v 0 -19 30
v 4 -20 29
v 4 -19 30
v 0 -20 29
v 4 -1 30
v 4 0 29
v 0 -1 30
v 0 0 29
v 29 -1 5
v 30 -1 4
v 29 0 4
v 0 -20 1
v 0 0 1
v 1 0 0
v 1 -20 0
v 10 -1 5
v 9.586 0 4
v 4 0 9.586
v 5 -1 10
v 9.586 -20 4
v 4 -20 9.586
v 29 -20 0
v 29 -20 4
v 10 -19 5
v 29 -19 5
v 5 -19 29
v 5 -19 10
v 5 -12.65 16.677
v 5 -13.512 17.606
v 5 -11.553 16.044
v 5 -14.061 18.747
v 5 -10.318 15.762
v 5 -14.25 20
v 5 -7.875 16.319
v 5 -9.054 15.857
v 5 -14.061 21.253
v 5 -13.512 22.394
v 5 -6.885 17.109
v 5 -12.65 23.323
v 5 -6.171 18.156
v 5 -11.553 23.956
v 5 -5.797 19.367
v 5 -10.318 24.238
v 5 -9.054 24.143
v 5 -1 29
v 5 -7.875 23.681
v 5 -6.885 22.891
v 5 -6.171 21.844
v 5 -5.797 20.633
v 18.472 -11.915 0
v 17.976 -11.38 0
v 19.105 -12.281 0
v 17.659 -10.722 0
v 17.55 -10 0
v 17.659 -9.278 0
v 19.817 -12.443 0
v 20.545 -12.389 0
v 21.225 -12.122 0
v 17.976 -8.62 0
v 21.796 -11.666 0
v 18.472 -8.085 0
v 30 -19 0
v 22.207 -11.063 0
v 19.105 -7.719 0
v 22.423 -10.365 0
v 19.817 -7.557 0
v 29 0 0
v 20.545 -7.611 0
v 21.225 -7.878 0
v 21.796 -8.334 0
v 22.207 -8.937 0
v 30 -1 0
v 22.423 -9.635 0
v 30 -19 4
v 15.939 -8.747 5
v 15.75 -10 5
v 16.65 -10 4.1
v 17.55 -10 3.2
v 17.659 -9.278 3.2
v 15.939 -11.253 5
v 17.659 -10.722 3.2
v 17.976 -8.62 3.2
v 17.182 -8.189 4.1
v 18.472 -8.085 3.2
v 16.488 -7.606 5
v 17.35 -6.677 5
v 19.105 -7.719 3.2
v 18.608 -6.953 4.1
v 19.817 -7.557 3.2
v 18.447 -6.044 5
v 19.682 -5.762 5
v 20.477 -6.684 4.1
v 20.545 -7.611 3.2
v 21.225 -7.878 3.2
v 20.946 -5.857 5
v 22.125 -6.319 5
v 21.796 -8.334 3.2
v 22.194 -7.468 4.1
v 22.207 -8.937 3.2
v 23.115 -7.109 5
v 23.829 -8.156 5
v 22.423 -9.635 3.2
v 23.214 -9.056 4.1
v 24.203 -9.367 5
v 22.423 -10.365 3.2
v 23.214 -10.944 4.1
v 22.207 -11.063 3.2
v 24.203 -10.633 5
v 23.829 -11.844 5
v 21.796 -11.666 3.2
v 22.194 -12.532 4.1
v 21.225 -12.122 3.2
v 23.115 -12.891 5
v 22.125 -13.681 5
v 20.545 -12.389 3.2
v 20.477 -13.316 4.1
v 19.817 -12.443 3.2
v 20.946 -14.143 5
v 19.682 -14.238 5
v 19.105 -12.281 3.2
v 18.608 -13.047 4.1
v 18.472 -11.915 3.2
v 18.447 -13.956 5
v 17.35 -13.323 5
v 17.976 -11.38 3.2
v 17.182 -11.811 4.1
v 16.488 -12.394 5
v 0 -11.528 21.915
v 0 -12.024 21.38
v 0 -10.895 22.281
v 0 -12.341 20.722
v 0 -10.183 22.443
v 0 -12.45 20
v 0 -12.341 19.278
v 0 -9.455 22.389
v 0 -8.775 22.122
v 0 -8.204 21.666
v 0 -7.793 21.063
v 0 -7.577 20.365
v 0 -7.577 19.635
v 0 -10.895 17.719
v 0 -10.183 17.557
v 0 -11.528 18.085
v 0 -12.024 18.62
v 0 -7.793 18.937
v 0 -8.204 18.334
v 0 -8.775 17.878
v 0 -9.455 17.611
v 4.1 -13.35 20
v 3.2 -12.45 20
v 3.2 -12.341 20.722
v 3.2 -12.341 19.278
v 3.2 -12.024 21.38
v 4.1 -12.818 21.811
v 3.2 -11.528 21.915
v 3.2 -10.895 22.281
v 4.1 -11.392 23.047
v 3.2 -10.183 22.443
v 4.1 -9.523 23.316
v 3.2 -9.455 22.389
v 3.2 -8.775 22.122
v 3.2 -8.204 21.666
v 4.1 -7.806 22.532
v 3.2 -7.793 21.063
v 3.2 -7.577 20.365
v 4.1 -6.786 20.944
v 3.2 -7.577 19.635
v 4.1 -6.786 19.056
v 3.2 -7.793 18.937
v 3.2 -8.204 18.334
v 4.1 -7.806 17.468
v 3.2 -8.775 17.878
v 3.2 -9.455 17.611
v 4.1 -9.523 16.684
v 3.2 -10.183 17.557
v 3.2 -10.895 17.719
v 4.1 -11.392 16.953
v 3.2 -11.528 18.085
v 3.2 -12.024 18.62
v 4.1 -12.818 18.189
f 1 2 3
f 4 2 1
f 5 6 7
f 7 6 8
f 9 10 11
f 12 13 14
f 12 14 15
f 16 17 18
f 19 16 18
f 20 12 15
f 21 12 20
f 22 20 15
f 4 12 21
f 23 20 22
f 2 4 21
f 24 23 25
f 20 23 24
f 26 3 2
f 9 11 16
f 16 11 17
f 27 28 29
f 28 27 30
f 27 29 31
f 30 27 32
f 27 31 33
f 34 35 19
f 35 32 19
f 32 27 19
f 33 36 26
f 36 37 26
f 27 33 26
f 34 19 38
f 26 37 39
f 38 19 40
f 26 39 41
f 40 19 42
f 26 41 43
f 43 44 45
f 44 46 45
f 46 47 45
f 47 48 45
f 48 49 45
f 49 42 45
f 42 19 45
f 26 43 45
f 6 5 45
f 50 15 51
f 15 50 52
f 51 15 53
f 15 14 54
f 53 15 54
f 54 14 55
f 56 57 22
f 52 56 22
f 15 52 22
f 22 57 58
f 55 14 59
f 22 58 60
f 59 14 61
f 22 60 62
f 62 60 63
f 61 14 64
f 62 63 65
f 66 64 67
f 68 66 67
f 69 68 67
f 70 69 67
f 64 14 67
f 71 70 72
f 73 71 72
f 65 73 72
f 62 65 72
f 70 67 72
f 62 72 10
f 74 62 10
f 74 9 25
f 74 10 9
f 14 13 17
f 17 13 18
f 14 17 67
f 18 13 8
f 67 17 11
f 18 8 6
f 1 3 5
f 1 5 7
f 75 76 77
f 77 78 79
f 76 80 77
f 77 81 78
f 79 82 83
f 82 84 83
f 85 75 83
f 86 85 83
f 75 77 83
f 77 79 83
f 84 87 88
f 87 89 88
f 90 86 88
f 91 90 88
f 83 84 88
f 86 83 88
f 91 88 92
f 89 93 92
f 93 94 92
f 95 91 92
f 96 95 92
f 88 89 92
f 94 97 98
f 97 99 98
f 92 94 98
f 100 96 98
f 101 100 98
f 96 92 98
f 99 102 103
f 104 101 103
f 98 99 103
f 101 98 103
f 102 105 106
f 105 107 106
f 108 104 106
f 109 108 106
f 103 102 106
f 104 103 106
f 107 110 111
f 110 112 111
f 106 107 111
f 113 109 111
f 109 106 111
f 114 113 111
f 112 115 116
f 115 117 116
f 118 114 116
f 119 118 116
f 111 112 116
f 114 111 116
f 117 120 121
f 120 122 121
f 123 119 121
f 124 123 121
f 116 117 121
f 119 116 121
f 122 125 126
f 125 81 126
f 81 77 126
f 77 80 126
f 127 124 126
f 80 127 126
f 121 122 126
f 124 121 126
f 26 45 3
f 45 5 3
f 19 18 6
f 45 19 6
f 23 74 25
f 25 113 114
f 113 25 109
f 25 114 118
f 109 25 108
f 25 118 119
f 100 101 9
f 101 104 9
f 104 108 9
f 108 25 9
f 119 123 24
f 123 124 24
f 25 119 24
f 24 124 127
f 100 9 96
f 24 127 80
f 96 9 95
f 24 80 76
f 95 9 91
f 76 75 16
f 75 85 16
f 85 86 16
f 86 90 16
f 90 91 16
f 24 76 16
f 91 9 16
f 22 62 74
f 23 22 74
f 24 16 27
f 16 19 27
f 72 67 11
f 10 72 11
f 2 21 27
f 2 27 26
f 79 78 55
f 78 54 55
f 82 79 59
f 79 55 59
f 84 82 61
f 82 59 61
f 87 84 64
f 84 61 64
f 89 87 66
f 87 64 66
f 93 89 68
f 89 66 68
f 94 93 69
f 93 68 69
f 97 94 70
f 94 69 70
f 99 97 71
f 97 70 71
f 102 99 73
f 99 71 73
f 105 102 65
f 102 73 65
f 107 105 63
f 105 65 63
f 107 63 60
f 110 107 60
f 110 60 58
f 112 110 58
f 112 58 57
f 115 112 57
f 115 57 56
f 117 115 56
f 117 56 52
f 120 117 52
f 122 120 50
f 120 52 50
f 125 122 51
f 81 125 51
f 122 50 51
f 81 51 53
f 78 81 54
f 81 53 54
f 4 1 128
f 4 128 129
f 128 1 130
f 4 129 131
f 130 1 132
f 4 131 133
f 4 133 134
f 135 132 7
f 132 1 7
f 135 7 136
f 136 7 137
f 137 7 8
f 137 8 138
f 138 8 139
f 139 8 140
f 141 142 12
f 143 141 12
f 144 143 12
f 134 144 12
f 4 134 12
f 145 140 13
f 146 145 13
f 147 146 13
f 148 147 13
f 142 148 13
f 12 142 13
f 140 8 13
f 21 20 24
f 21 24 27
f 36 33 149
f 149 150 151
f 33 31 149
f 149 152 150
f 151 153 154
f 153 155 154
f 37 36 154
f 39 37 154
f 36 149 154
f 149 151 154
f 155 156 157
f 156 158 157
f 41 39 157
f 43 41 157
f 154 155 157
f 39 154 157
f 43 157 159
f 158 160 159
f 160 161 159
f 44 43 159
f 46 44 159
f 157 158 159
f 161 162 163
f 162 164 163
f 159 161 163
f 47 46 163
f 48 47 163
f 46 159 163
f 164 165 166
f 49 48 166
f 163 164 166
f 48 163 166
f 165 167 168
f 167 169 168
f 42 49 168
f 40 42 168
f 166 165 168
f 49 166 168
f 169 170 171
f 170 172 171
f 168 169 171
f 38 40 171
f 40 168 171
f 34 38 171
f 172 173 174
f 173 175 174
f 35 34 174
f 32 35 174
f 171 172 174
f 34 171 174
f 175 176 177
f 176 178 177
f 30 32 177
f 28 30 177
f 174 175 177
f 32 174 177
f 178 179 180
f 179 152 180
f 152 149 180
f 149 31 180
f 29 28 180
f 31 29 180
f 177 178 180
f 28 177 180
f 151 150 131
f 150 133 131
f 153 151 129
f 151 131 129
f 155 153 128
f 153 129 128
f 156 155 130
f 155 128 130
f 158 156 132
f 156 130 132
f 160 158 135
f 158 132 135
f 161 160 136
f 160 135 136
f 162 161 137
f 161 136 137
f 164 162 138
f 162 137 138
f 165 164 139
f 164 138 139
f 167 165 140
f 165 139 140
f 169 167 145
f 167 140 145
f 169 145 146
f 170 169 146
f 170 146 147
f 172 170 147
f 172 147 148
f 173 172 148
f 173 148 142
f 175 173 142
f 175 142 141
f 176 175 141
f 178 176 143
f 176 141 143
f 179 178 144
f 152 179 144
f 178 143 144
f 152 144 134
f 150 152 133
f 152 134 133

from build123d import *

# Parameters (mm, degrees)
F2_DEPTH             = 20
F3_SIZE              = 5
F6_D                 = 4.9
F6_DEPTH             = 16
F6_CSINK_D           = 8.5
F6_CSINK_ANGLE       = 90
F6_TIP               = 1.4721085166
F6_ON_F4_D           = 4.9
F6_ON_F4_DEPTH       = 16
F6_ON_F4_CSINK_D     = 8.5
F6_ON_F4_CSINK_ANGLE = 90
F6_ON_F4_TIP         = 1.4721085166
F7_SIZE              = 1
F8_SIZE              = 1


with BuildPart() as f2:
    # F1 (on Front) → F2 (new body)
    with BuildSketch(Plane.XZ):
        Polygon((0, 30), (0, 0), (30, 0), (30, 5), (5, 5), (5, 30), align=None)
    extrude(amount=F2_DEPTH)

    # F3
    f3_edges = [f2.edges().sort_by_distance(p)[0] for p in [
        (5, -10, 5),
    ]]
    chamfer(f3_edges, length=F3_SIZE)

    # F6
    with Locations(Plane.YZ.offset(5)):
        with Locations((-10, 20)):
            CounterSinkHole(F6_D / 2, F6_CSINK_D / 2, depth=F6_DEPTH, counter_sink_angle=F6_CSINK_ANGLE)
            with Locations((0, 0, -(F6_DEPTH + F6_TIP / 2))):  # 118° drill point
                Cone(0, F6_D / 2, F6_TIP, mode=Mode.SUBTRACT)

    # F6 on F4
    with Locations(Plane.XY.offset(5)):
        with Locations((20, -10)):
            CounterSinkHole(F6_ON_F4_D / 2, F6_ON_F4_CSINK_D / 2, depth=F6_ON_F4_DEPTH, counter_sink_angle=F6_ON_F4_CSINK_ANGLE)
            with Locations((0, 0, -(F6_ON_F4_DEPTH + F6_ON_F4_TIP / 2))):  # 118° drill point
                Cone(0, F6_ON_F4_D / 2, F6_ON_F4_TIP, mode=Mode.SUBTRACT)

    # F7
    f7_edges = [f2.edges().sort_by_distance(p)[0] for p in [
        (30, -10, 5),
        (5, -10, 30),
        (30, -20, 2.5),
        (20, -20, 5),
        (7.5, -20, 7.5),
        (2.5, -20, 30),
        (30, 0, 2.5),
        (20, 0, 5),
        (7.5, 0, 7.5),
        (2.5, 0, 30),
        (5, -20, 20),
        (5, 0, 20),
    ]]
    chamfer(f7_edges, length=F7_SIZE)

    # F8
    f8_edges = [f2.edges().sort_by_distance(p)[0] for p in [
        (0, -10, 0),
    ]]
    chamfer(f8_edges, length=F8_SIZE)


solid = f2.part
